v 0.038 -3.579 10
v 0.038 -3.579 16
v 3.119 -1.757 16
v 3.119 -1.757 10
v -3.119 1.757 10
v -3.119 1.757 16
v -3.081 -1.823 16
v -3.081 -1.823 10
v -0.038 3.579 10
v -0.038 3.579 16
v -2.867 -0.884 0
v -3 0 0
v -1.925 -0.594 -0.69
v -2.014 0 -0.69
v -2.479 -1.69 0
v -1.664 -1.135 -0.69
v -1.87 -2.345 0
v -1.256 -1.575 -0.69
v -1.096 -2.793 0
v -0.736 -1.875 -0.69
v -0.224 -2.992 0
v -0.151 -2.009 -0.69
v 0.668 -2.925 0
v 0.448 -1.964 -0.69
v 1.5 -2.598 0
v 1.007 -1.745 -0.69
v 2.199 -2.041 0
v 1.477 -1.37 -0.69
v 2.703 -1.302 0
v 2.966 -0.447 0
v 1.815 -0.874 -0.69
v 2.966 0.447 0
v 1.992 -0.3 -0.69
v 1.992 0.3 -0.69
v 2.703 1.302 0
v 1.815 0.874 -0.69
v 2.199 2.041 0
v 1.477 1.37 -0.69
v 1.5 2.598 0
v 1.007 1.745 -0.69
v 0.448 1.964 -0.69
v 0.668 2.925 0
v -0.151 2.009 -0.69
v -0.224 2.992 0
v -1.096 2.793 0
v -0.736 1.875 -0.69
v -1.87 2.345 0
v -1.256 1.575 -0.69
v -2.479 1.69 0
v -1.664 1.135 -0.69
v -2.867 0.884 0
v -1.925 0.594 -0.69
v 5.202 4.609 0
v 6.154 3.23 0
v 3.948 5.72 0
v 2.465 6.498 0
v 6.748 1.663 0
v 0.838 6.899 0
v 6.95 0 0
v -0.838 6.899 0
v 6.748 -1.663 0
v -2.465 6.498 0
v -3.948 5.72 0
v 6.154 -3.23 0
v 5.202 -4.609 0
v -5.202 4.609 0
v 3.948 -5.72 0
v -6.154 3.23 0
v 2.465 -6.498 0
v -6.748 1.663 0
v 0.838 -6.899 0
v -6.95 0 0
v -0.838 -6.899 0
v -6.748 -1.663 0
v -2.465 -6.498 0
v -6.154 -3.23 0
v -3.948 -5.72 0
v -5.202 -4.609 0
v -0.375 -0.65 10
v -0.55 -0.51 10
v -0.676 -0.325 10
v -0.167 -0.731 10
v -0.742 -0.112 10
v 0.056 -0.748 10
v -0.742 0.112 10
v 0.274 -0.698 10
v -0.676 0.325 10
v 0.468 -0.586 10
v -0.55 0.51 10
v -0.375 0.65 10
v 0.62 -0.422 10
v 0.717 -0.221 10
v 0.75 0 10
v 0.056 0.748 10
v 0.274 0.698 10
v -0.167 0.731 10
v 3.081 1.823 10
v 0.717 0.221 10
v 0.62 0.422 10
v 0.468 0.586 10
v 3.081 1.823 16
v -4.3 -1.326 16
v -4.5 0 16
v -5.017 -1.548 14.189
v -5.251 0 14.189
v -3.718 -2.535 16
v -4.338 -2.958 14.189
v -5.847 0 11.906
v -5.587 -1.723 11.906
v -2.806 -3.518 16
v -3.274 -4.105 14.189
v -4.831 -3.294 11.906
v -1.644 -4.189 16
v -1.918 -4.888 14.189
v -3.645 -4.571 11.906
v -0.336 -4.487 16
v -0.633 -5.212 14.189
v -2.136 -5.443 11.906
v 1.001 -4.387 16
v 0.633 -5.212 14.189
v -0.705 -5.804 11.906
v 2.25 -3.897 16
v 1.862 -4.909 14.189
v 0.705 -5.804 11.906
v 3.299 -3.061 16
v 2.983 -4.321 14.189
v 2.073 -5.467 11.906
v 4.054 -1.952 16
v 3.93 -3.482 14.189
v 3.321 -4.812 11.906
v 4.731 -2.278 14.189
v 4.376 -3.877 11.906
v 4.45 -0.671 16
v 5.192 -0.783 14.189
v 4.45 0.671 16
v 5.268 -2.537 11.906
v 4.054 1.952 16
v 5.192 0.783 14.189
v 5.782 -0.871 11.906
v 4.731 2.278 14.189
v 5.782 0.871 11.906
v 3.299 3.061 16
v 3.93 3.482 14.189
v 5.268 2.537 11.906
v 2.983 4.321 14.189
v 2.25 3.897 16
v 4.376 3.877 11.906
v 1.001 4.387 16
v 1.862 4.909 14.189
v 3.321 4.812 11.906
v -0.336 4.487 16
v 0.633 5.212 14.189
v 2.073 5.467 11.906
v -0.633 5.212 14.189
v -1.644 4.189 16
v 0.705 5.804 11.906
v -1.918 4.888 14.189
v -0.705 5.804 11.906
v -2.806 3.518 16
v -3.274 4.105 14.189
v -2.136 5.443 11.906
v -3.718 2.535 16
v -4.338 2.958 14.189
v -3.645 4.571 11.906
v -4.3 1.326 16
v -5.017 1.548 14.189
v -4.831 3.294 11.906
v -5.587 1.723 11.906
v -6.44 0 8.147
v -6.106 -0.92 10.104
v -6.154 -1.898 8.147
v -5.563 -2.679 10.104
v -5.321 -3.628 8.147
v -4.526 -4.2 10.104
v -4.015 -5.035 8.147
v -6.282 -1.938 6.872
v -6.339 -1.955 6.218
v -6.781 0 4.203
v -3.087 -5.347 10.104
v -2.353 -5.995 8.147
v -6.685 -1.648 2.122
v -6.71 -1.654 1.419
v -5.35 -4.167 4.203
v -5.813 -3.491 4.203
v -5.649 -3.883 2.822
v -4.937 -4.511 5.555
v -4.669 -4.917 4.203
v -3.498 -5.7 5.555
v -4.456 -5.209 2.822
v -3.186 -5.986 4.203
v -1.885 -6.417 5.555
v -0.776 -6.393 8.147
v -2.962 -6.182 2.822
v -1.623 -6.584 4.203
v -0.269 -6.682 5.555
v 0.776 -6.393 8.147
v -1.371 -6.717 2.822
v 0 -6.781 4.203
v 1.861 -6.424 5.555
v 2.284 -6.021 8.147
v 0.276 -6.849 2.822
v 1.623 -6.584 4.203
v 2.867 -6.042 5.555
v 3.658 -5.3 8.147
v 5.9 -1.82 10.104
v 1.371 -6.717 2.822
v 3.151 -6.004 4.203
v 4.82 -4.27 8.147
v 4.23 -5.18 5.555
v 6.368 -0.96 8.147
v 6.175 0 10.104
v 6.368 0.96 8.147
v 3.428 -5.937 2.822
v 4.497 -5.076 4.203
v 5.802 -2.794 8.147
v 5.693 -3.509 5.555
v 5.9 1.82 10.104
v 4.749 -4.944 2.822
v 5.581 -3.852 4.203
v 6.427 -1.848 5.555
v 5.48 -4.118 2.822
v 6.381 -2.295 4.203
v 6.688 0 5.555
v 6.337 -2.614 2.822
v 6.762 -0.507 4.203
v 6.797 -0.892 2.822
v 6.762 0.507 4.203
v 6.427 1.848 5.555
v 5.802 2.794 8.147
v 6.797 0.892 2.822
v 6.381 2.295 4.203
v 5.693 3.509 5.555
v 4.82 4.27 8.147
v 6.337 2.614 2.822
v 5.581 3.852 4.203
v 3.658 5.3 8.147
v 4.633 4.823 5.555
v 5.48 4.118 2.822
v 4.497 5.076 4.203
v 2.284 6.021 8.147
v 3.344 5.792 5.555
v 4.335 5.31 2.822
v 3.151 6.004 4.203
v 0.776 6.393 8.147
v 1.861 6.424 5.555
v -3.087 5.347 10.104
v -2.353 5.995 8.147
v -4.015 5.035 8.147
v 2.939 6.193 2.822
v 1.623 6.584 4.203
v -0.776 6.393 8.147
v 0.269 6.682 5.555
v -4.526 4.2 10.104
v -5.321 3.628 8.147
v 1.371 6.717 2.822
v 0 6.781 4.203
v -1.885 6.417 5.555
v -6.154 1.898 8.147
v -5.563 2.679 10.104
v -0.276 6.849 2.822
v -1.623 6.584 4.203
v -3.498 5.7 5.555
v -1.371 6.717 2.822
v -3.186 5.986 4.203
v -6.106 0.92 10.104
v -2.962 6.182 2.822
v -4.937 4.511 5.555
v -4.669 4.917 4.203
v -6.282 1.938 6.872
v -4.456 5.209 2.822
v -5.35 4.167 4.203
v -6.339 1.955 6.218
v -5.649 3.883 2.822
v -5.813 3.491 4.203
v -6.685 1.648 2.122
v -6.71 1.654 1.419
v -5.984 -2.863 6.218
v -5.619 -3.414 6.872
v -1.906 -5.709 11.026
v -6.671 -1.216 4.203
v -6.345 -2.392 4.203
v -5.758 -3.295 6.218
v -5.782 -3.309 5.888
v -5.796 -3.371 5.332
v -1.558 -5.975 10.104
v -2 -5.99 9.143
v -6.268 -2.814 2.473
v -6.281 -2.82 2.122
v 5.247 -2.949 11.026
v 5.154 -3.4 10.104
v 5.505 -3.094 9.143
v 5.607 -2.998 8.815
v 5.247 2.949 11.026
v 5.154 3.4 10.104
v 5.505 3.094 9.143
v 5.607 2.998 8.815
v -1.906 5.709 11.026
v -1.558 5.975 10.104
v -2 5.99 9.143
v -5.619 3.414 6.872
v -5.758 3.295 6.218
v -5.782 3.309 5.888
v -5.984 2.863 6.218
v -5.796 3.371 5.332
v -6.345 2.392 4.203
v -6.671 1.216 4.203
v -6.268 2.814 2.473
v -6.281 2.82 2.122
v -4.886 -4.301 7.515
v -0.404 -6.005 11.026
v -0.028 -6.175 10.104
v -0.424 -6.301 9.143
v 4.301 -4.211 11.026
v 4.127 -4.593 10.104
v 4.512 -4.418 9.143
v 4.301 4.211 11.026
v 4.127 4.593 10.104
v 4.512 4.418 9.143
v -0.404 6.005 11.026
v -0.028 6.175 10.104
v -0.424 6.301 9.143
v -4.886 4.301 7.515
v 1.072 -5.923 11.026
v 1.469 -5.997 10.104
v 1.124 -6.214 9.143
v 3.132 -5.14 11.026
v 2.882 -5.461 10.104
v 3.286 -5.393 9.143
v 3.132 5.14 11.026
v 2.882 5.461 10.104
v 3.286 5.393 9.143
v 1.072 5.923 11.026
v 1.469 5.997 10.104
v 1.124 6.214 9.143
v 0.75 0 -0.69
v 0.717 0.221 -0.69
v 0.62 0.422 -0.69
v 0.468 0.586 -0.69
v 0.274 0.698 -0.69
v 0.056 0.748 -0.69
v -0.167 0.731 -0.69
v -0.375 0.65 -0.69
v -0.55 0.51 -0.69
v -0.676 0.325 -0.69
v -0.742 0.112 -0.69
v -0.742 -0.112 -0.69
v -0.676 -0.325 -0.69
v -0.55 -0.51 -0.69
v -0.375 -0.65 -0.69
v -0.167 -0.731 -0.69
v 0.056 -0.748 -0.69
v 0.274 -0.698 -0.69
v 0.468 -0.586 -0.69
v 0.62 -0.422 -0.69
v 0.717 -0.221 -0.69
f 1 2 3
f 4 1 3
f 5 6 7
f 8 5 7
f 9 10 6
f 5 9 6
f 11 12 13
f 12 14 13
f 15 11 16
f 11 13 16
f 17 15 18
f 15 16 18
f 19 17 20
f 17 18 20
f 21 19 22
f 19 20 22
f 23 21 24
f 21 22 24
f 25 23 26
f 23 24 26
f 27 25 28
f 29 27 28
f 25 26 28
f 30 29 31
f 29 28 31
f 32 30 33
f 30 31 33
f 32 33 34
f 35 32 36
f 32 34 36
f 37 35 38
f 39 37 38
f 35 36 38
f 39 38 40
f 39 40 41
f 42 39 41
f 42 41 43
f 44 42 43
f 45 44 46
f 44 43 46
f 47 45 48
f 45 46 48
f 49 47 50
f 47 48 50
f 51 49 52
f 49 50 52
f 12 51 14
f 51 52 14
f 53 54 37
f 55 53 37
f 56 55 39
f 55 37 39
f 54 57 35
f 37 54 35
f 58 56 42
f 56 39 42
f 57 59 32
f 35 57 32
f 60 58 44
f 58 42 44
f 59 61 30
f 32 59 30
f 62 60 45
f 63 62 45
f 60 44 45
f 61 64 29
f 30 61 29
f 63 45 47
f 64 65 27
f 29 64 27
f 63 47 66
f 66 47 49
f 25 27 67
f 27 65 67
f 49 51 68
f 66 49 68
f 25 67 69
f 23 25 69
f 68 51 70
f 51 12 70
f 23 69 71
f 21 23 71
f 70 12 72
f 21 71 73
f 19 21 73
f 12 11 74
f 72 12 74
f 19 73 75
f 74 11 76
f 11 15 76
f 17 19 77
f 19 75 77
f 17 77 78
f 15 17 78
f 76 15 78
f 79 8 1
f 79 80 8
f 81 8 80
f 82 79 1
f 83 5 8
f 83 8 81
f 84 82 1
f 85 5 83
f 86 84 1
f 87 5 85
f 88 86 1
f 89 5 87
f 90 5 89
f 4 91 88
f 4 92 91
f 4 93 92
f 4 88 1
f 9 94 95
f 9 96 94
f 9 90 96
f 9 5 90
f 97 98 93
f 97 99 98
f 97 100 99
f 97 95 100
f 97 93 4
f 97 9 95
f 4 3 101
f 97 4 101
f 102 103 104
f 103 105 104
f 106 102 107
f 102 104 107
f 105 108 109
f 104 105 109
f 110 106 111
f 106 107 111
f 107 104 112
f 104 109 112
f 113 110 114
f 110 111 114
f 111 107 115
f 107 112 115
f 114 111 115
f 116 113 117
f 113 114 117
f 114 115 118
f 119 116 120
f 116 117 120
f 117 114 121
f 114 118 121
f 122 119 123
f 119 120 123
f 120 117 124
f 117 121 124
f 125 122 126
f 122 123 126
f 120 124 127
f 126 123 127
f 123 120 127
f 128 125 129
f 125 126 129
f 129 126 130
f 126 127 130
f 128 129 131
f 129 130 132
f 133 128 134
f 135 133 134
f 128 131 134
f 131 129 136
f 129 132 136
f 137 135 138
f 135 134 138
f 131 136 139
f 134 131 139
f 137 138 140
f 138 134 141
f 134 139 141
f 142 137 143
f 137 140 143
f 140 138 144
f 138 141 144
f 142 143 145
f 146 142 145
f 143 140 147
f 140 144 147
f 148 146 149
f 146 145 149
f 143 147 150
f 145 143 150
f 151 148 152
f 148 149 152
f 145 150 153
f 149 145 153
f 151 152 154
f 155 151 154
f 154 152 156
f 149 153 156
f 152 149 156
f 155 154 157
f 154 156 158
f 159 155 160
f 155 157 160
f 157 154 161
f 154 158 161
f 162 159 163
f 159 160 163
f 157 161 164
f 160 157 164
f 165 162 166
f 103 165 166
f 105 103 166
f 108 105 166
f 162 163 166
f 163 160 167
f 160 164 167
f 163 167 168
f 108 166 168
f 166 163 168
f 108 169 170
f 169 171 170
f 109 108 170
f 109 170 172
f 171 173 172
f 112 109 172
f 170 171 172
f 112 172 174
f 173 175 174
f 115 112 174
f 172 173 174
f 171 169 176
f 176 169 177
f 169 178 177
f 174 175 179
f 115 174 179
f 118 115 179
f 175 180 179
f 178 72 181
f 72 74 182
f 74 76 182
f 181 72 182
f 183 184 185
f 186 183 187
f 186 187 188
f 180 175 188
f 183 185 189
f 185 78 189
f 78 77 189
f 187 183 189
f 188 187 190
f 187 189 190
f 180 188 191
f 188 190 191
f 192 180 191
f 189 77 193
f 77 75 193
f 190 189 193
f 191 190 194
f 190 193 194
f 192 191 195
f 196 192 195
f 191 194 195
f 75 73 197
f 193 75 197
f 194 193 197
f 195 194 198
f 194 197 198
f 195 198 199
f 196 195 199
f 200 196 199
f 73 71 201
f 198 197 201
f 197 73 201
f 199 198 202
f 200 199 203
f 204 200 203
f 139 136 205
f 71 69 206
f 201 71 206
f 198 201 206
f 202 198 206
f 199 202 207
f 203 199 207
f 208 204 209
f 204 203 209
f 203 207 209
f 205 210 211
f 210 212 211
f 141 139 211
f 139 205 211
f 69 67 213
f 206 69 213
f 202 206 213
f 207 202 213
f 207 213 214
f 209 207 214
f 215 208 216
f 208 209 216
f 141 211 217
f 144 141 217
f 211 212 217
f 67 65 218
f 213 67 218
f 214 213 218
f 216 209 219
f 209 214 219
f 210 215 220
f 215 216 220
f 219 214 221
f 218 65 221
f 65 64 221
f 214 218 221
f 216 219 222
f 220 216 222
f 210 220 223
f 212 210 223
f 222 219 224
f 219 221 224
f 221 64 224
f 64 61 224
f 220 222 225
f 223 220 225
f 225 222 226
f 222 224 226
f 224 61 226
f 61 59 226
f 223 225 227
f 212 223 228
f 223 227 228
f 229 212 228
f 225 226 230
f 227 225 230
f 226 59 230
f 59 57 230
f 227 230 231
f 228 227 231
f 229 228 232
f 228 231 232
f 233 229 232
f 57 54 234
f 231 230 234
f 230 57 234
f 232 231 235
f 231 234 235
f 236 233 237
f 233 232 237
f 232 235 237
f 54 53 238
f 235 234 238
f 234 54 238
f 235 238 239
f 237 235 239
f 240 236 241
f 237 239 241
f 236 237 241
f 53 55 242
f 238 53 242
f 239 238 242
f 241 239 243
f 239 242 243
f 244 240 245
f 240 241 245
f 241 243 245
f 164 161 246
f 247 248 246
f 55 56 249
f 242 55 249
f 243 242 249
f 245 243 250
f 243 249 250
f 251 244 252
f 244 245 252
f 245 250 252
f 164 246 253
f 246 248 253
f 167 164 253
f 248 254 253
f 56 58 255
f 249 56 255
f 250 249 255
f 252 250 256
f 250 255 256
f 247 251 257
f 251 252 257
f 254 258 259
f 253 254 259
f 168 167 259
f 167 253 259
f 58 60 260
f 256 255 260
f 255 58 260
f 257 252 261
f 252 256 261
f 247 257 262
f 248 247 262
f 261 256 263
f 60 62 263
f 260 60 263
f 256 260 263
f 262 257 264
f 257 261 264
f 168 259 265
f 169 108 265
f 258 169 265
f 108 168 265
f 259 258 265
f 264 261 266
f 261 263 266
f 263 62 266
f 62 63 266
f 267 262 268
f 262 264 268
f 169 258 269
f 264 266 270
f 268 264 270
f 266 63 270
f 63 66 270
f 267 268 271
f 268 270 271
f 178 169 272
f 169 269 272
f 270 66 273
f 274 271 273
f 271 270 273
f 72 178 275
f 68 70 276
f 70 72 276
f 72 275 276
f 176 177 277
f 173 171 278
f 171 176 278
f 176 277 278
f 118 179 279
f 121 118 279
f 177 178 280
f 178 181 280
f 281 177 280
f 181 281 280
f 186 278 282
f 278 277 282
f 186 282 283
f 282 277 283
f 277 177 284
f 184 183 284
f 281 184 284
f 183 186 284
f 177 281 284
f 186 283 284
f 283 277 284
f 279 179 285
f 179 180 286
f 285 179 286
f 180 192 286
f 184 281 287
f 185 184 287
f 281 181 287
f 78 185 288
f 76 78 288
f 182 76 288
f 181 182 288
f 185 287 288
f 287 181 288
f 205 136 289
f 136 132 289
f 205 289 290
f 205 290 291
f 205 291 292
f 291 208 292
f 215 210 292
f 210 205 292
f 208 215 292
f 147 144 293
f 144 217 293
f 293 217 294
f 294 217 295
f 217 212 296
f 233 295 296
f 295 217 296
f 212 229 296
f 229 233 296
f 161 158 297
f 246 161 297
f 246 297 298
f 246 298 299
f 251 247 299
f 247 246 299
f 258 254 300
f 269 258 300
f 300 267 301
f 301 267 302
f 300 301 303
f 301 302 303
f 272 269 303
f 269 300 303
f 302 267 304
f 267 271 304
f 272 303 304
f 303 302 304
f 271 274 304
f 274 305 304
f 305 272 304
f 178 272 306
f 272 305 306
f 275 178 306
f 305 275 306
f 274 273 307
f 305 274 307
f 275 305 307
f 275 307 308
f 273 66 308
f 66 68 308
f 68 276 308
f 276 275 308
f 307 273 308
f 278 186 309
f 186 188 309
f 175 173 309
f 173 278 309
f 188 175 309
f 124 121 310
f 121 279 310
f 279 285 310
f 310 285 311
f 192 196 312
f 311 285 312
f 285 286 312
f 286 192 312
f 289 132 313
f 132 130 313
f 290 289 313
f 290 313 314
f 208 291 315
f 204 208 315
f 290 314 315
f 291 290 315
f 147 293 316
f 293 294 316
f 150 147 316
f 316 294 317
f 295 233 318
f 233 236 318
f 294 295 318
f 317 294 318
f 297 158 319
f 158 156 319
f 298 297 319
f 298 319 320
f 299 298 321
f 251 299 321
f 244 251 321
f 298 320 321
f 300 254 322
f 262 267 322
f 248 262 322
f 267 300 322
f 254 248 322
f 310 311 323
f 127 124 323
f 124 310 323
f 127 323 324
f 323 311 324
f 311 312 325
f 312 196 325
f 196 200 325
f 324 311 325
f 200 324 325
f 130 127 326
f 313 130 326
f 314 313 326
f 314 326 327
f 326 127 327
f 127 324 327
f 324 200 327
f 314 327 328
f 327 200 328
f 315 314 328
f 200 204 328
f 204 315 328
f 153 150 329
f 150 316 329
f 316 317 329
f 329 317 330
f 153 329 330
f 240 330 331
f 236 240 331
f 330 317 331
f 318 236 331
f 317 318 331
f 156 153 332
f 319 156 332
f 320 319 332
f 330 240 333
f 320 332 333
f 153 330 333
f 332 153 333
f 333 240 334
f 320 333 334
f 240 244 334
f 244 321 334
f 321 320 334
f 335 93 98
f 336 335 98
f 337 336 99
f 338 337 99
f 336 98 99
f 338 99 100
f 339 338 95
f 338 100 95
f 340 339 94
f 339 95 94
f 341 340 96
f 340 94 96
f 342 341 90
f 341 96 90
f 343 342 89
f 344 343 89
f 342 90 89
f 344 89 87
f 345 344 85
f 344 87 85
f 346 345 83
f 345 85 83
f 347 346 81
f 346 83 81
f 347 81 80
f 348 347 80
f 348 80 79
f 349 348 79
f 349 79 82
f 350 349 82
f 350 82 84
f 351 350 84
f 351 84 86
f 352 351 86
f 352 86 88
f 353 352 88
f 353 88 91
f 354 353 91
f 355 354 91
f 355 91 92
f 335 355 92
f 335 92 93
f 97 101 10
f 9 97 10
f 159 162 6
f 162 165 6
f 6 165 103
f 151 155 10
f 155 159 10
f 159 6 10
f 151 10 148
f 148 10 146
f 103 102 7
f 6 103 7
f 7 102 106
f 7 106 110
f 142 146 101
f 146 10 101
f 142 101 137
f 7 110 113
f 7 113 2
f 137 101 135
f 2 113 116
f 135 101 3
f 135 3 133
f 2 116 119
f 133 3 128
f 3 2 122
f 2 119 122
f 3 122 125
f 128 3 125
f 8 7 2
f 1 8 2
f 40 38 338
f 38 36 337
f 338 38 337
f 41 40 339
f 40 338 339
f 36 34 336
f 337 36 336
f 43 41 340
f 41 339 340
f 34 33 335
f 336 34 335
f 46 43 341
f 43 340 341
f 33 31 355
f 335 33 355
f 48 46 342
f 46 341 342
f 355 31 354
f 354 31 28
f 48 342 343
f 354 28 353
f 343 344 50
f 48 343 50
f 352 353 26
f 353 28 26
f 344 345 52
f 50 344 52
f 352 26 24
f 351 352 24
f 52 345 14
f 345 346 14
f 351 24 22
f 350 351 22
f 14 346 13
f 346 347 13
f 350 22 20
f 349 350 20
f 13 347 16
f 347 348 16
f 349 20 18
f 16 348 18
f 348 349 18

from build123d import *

# Parameters (mm, degrees)
F3_DEPTH = 6
F4_R     = 0.75
F5_DEPTH = 10.691096


with BuildPart() as f1:
    # F0 (on Front) → F1 (revolve)
    with BuildSketch(Plane.XZ):
        with BuildLine():
            Line((0, -0.690096), (0, 0))
            Line((0, 0), (0, 16))
            Line((0, 16), (-4.5, 16))
            add(Edge.make_bspline(
                [(-4.5, 16), (-6.14538, 12.944644), (-6.807135, 6.615023), (-6.95, 0)],
                knots=[0, 0, 0, 0, 16.186491, 16.186491, 16.186491, 16.186491], degree=3))
            Line((-6.95, 0), (-3, 0))
            Line((-3, 0), (-2.014441, -0.690096))
            Line((-2.014441, -0.690096), (0, -0.690096))
        make_face()
    revolve(axis=Axis((0, 0, 8), (0, 0, 1)))

    # F2 (on face) → F3 (cut)
    with BuildSketch(Plane.XY.offset(16)):
        Polygon((-0.037923, 3.579371), (-3.118788, 1.756843), (-3.080864, -1.822528), (0.037923, -3.579371), (3.118788, -1.756843), (3.080864, 1.822528), align=None)
    extrude(amount=-F3_DEPTH, mode=Mode.SUBTRACT)

    # F4 (on face) → F5 (cut, through all)
    with BuildSketch(Plane.XY.offset(10)):
        Circle(F4_R)
    extrude(amount=-F5_DEPTH, mode=Mode.SUBTRACT)


solid = f1.part
